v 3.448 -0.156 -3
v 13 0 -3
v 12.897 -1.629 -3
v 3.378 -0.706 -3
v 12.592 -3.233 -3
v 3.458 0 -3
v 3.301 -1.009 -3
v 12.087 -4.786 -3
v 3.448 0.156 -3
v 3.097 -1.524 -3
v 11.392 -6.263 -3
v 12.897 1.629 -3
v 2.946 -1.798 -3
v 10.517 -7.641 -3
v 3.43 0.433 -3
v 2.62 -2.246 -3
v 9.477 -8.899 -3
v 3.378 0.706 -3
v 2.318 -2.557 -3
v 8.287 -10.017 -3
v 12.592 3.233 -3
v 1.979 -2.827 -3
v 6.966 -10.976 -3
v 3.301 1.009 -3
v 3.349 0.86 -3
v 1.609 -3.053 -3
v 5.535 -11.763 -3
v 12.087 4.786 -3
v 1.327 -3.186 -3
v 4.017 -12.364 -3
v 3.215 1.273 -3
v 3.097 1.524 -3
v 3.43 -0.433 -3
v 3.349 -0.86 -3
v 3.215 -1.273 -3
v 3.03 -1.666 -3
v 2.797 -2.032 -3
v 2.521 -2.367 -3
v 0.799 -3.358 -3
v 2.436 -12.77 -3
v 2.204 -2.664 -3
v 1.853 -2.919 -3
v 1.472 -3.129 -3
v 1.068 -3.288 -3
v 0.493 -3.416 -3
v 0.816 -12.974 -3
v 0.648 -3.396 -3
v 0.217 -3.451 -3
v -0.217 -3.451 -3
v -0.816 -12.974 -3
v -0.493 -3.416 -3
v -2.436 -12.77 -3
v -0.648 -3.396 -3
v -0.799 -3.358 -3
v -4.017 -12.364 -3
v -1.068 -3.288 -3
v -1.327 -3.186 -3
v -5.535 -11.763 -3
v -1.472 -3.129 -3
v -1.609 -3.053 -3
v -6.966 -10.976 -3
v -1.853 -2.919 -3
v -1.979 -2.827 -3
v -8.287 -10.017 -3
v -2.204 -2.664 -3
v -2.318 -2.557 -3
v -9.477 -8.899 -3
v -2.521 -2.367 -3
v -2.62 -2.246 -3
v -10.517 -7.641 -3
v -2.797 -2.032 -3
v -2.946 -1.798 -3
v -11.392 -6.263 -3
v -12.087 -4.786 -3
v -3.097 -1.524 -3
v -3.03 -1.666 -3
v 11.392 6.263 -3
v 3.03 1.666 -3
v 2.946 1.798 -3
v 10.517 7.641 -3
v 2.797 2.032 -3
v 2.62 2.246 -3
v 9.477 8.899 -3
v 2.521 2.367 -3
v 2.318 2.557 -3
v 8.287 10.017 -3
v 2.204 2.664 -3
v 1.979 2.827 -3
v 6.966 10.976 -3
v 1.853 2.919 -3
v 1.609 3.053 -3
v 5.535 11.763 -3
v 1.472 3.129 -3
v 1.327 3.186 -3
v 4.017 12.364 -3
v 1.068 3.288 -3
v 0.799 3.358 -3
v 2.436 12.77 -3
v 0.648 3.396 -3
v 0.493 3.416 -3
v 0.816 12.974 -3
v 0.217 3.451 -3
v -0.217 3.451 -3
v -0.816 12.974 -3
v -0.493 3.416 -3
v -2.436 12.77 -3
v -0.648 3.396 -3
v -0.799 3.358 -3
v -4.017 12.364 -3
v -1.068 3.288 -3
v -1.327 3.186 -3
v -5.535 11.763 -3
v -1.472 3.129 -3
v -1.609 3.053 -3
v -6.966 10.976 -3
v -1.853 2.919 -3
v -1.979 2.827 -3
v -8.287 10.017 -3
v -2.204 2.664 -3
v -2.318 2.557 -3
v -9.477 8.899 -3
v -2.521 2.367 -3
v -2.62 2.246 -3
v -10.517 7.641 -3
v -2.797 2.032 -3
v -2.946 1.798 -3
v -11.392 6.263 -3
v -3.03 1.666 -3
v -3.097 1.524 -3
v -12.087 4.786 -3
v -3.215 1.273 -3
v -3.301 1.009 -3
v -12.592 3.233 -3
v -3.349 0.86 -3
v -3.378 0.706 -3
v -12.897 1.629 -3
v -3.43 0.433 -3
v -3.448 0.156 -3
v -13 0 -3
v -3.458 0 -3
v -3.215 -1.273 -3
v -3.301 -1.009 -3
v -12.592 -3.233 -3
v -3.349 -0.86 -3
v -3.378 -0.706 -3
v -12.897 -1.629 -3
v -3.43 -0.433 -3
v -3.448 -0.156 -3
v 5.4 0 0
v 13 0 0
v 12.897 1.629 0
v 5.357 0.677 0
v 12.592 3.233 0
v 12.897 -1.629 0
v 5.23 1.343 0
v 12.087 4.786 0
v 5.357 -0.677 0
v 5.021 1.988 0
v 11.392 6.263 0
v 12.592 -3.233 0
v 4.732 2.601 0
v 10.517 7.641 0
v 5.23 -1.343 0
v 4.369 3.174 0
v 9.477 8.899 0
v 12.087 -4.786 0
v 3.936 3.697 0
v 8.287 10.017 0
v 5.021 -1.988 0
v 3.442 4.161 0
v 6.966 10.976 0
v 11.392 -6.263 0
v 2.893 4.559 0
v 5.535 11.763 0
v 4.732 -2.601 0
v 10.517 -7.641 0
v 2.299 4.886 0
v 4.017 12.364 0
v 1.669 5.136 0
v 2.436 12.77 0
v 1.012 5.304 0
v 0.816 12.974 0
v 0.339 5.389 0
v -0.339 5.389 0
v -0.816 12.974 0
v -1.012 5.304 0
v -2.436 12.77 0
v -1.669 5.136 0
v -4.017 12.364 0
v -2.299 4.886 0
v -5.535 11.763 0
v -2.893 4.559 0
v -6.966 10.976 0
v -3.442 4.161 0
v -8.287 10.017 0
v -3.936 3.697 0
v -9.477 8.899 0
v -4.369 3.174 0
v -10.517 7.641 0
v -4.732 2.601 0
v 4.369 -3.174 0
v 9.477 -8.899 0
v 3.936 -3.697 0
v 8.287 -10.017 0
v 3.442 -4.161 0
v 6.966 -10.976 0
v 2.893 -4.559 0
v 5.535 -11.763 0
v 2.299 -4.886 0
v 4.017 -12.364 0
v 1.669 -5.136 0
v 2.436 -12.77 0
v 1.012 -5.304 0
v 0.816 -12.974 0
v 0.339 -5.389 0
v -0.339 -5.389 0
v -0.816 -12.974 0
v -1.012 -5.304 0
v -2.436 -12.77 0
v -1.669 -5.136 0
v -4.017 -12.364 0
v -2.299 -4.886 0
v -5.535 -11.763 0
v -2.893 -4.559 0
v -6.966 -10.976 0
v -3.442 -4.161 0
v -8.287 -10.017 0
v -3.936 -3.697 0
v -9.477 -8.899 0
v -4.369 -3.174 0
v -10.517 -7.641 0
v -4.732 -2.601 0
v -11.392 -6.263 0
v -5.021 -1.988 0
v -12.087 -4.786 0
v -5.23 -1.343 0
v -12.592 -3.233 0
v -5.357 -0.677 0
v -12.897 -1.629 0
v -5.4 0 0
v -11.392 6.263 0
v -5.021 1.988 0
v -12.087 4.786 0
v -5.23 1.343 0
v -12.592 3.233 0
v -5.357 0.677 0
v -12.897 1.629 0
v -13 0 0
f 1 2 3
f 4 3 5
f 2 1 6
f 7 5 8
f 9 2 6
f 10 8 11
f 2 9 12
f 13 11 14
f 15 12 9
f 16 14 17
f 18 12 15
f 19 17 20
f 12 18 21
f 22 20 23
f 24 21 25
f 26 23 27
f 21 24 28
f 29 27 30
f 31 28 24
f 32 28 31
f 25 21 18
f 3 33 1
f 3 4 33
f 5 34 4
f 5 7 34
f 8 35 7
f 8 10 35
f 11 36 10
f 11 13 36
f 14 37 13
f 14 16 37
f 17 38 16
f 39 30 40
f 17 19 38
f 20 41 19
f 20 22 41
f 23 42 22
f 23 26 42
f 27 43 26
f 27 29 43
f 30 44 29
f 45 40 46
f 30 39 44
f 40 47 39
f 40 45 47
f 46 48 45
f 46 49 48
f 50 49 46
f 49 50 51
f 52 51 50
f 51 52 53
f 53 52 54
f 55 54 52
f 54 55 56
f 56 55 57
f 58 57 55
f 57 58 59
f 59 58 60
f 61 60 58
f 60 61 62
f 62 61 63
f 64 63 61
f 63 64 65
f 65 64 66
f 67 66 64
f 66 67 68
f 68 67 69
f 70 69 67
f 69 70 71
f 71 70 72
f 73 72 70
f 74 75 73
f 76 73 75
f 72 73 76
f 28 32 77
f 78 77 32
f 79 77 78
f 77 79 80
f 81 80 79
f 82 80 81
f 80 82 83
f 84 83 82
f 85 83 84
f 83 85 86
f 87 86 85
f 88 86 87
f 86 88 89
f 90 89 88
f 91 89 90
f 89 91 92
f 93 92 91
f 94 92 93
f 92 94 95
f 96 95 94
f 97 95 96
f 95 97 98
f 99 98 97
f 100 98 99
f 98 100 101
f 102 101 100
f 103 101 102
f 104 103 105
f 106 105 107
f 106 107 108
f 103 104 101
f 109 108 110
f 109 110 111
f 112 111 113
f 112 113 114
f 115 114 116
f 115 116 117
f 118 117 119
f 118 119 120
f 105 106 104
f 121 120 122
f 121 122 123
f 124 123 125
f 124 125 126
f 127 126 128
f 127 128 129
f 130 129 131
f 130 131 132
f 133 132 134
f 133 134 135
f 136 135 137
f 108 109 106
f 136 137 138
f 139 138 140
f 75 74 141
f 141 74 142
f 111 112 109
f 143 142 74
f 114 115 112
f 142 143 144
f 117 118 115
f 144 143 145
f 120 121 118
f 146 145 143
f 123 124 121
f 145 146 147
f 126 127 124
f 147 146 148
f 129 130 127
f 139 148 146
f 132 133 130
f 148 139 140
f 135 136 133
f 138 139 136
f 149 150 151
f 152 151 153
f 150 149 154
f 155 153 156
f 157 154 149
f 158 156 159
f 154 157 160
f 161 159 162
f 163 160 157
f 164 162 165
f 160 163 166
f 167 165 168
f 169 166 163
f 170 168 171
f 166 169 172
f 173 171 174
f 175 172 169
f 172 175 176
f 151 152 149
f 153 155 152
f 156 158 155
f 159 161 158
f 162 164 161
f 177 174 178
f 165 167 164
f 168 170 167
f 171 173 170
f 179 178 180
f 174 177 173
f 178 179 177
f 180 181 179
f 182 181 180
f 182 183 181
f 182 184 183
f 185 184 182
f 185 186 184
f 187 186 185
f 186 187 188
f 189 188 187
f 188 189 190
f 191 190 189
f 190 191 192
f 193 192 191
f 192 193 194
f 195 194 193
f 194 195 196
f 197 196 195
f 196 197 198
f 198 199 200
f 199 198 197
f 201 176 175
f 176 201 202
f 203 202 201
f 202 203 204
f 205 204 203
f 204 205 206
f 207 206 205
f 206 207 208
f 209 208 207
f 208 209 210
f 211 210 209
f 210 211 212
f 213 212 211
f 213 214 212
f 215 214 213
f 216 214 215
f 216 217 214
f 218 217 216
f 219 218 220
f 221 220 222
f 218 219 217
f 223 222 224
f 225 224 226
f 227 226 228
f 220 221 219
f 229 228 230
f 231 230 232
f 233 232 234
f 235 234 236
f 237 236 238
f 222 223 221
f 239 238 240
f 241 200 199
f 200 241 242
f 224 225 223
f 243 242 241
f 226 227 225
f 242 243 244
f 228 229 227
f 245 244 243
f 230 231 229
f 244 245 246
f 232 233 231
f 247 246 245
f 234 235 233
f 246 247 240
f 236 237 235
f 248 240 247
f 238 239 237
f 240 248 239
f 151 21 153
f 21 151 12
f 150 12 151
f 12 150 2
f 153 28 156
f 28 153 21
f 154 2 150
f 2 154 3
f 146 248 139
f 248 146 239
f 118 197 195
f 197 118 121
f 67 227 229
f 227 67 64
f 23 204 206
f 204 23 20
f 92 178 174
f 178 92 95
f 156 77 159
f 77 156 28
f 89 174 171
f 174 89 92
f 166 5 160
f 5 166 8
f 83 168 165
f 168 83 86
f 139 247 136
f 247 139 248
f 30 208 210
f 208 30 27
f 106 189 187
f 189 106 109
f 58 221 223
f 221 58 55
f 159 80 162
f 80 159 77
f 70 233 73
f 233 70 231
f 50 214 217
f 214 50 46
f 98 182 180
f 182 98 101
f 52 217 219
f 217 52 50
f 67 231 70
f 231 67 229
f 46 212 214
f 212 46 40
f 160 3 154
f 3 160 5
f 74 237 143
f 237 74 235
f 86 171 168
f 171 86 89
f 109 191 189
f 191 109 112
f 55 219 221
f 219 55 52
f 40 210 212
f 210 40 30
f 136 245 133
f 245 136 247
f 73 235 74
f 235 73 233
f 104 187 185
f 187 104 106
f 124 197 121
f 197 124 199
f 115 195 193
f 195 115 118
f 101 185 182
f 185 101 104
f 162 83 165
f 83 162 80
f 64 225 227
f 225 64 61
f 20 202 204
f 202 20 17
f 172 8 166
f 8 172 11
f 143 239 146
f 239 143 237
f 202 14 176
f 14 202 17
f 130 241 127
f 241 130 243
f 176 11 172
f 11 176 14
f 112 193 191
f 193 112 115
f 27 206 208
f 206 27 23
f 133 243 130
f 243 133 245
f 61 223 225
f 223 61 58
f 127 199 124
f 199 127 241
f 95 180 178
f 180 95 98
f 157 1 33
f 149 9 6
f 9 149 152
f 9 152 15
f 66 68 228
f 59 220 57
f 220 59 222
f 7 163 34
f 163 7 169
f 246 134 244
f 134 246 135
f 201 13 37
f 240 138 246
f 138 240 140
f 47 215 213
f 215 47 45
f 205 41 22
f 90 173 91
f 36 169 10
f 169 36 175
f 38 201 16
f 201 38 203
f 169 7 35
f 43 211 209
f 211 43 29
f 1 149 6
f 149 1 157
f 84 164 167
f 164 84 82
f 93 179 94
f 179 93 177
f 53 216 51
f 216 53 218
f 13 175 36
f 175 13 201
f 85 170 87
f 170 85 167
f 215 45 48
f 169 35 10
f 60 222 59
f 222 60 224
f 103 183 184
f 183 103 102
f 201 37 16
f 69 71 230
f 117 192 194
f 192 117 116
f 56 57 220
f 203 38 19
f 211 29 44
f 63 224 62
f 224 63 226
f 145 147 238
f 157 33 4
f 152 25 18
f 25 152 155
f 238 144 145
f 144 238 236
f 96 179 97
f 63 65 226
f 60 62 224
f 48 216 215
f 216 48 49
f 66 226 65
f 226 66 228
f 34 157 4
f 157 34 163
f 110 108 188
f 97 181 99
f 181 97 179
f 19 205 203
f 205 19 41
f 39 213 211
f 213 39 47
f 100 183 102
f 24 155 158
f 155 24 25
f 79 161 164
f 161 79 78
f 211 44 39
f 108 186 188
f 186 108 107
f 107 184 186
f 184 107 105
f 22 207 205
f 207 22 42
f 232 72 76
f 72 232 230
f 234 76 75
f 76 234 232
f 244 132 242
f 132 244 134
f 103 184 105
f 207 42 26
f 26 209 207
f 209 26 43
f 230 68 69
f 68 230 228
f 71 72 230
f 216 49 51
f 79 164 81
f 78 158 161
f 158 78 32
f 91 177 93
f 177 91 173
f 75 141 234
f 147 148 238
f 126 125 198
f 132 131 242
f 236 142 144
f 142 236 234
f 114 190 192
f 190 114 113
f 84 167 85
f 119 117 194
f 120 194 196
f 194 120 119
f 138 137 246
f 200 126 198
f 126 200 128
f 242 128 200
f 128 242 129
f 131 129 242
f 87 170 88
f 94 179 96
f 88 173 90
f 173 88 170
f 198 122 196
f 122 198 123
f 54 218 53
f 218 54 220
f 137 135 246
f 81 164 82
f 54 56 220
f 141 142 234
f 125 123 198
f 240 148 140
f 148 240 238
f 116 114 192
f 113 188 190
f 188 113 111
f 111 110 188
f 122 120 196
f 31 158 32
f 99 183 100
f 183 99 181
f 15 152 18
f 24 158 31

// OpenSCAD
$fn = 50;


difference() {
	union() {
		translate(v = [0, 0, -3.0000000000]) {
			cylinder(h = 3, r = 7.0000000000);
		}
		translate(v = [0, 0, -3.0000000000]) {
			cylinder(h = 3, r = 13.0000000000);
		}
	}
	union() {
		translate(v = [0, 0, 0]) {
			rotate(a = [0, 0, 0]) {
				difference() {
					union() {
						#translate(v = [0, 0, -3.0000000000]) {
							cylinder(h = 3, r = 2.6000000000);
						}
						#translate(v = [0, 0, -3.9000000000]) {
							cylinder(h = 3.9000000000, r = 7.0000000000, r1 = 2.8750000000, r2 = 5.4000000000);
						}
						#translate(v = [0, 0, -3.0000000000]) {
							cylinder(h = 3, r = 2.8750000000);
						}
						#translate(v = [0, 0, -3.0000000000]) {
							cylinder(h = 3, r = 2.6000000000);
						}
					}
					union();
				}
			}
		}
	}
}
